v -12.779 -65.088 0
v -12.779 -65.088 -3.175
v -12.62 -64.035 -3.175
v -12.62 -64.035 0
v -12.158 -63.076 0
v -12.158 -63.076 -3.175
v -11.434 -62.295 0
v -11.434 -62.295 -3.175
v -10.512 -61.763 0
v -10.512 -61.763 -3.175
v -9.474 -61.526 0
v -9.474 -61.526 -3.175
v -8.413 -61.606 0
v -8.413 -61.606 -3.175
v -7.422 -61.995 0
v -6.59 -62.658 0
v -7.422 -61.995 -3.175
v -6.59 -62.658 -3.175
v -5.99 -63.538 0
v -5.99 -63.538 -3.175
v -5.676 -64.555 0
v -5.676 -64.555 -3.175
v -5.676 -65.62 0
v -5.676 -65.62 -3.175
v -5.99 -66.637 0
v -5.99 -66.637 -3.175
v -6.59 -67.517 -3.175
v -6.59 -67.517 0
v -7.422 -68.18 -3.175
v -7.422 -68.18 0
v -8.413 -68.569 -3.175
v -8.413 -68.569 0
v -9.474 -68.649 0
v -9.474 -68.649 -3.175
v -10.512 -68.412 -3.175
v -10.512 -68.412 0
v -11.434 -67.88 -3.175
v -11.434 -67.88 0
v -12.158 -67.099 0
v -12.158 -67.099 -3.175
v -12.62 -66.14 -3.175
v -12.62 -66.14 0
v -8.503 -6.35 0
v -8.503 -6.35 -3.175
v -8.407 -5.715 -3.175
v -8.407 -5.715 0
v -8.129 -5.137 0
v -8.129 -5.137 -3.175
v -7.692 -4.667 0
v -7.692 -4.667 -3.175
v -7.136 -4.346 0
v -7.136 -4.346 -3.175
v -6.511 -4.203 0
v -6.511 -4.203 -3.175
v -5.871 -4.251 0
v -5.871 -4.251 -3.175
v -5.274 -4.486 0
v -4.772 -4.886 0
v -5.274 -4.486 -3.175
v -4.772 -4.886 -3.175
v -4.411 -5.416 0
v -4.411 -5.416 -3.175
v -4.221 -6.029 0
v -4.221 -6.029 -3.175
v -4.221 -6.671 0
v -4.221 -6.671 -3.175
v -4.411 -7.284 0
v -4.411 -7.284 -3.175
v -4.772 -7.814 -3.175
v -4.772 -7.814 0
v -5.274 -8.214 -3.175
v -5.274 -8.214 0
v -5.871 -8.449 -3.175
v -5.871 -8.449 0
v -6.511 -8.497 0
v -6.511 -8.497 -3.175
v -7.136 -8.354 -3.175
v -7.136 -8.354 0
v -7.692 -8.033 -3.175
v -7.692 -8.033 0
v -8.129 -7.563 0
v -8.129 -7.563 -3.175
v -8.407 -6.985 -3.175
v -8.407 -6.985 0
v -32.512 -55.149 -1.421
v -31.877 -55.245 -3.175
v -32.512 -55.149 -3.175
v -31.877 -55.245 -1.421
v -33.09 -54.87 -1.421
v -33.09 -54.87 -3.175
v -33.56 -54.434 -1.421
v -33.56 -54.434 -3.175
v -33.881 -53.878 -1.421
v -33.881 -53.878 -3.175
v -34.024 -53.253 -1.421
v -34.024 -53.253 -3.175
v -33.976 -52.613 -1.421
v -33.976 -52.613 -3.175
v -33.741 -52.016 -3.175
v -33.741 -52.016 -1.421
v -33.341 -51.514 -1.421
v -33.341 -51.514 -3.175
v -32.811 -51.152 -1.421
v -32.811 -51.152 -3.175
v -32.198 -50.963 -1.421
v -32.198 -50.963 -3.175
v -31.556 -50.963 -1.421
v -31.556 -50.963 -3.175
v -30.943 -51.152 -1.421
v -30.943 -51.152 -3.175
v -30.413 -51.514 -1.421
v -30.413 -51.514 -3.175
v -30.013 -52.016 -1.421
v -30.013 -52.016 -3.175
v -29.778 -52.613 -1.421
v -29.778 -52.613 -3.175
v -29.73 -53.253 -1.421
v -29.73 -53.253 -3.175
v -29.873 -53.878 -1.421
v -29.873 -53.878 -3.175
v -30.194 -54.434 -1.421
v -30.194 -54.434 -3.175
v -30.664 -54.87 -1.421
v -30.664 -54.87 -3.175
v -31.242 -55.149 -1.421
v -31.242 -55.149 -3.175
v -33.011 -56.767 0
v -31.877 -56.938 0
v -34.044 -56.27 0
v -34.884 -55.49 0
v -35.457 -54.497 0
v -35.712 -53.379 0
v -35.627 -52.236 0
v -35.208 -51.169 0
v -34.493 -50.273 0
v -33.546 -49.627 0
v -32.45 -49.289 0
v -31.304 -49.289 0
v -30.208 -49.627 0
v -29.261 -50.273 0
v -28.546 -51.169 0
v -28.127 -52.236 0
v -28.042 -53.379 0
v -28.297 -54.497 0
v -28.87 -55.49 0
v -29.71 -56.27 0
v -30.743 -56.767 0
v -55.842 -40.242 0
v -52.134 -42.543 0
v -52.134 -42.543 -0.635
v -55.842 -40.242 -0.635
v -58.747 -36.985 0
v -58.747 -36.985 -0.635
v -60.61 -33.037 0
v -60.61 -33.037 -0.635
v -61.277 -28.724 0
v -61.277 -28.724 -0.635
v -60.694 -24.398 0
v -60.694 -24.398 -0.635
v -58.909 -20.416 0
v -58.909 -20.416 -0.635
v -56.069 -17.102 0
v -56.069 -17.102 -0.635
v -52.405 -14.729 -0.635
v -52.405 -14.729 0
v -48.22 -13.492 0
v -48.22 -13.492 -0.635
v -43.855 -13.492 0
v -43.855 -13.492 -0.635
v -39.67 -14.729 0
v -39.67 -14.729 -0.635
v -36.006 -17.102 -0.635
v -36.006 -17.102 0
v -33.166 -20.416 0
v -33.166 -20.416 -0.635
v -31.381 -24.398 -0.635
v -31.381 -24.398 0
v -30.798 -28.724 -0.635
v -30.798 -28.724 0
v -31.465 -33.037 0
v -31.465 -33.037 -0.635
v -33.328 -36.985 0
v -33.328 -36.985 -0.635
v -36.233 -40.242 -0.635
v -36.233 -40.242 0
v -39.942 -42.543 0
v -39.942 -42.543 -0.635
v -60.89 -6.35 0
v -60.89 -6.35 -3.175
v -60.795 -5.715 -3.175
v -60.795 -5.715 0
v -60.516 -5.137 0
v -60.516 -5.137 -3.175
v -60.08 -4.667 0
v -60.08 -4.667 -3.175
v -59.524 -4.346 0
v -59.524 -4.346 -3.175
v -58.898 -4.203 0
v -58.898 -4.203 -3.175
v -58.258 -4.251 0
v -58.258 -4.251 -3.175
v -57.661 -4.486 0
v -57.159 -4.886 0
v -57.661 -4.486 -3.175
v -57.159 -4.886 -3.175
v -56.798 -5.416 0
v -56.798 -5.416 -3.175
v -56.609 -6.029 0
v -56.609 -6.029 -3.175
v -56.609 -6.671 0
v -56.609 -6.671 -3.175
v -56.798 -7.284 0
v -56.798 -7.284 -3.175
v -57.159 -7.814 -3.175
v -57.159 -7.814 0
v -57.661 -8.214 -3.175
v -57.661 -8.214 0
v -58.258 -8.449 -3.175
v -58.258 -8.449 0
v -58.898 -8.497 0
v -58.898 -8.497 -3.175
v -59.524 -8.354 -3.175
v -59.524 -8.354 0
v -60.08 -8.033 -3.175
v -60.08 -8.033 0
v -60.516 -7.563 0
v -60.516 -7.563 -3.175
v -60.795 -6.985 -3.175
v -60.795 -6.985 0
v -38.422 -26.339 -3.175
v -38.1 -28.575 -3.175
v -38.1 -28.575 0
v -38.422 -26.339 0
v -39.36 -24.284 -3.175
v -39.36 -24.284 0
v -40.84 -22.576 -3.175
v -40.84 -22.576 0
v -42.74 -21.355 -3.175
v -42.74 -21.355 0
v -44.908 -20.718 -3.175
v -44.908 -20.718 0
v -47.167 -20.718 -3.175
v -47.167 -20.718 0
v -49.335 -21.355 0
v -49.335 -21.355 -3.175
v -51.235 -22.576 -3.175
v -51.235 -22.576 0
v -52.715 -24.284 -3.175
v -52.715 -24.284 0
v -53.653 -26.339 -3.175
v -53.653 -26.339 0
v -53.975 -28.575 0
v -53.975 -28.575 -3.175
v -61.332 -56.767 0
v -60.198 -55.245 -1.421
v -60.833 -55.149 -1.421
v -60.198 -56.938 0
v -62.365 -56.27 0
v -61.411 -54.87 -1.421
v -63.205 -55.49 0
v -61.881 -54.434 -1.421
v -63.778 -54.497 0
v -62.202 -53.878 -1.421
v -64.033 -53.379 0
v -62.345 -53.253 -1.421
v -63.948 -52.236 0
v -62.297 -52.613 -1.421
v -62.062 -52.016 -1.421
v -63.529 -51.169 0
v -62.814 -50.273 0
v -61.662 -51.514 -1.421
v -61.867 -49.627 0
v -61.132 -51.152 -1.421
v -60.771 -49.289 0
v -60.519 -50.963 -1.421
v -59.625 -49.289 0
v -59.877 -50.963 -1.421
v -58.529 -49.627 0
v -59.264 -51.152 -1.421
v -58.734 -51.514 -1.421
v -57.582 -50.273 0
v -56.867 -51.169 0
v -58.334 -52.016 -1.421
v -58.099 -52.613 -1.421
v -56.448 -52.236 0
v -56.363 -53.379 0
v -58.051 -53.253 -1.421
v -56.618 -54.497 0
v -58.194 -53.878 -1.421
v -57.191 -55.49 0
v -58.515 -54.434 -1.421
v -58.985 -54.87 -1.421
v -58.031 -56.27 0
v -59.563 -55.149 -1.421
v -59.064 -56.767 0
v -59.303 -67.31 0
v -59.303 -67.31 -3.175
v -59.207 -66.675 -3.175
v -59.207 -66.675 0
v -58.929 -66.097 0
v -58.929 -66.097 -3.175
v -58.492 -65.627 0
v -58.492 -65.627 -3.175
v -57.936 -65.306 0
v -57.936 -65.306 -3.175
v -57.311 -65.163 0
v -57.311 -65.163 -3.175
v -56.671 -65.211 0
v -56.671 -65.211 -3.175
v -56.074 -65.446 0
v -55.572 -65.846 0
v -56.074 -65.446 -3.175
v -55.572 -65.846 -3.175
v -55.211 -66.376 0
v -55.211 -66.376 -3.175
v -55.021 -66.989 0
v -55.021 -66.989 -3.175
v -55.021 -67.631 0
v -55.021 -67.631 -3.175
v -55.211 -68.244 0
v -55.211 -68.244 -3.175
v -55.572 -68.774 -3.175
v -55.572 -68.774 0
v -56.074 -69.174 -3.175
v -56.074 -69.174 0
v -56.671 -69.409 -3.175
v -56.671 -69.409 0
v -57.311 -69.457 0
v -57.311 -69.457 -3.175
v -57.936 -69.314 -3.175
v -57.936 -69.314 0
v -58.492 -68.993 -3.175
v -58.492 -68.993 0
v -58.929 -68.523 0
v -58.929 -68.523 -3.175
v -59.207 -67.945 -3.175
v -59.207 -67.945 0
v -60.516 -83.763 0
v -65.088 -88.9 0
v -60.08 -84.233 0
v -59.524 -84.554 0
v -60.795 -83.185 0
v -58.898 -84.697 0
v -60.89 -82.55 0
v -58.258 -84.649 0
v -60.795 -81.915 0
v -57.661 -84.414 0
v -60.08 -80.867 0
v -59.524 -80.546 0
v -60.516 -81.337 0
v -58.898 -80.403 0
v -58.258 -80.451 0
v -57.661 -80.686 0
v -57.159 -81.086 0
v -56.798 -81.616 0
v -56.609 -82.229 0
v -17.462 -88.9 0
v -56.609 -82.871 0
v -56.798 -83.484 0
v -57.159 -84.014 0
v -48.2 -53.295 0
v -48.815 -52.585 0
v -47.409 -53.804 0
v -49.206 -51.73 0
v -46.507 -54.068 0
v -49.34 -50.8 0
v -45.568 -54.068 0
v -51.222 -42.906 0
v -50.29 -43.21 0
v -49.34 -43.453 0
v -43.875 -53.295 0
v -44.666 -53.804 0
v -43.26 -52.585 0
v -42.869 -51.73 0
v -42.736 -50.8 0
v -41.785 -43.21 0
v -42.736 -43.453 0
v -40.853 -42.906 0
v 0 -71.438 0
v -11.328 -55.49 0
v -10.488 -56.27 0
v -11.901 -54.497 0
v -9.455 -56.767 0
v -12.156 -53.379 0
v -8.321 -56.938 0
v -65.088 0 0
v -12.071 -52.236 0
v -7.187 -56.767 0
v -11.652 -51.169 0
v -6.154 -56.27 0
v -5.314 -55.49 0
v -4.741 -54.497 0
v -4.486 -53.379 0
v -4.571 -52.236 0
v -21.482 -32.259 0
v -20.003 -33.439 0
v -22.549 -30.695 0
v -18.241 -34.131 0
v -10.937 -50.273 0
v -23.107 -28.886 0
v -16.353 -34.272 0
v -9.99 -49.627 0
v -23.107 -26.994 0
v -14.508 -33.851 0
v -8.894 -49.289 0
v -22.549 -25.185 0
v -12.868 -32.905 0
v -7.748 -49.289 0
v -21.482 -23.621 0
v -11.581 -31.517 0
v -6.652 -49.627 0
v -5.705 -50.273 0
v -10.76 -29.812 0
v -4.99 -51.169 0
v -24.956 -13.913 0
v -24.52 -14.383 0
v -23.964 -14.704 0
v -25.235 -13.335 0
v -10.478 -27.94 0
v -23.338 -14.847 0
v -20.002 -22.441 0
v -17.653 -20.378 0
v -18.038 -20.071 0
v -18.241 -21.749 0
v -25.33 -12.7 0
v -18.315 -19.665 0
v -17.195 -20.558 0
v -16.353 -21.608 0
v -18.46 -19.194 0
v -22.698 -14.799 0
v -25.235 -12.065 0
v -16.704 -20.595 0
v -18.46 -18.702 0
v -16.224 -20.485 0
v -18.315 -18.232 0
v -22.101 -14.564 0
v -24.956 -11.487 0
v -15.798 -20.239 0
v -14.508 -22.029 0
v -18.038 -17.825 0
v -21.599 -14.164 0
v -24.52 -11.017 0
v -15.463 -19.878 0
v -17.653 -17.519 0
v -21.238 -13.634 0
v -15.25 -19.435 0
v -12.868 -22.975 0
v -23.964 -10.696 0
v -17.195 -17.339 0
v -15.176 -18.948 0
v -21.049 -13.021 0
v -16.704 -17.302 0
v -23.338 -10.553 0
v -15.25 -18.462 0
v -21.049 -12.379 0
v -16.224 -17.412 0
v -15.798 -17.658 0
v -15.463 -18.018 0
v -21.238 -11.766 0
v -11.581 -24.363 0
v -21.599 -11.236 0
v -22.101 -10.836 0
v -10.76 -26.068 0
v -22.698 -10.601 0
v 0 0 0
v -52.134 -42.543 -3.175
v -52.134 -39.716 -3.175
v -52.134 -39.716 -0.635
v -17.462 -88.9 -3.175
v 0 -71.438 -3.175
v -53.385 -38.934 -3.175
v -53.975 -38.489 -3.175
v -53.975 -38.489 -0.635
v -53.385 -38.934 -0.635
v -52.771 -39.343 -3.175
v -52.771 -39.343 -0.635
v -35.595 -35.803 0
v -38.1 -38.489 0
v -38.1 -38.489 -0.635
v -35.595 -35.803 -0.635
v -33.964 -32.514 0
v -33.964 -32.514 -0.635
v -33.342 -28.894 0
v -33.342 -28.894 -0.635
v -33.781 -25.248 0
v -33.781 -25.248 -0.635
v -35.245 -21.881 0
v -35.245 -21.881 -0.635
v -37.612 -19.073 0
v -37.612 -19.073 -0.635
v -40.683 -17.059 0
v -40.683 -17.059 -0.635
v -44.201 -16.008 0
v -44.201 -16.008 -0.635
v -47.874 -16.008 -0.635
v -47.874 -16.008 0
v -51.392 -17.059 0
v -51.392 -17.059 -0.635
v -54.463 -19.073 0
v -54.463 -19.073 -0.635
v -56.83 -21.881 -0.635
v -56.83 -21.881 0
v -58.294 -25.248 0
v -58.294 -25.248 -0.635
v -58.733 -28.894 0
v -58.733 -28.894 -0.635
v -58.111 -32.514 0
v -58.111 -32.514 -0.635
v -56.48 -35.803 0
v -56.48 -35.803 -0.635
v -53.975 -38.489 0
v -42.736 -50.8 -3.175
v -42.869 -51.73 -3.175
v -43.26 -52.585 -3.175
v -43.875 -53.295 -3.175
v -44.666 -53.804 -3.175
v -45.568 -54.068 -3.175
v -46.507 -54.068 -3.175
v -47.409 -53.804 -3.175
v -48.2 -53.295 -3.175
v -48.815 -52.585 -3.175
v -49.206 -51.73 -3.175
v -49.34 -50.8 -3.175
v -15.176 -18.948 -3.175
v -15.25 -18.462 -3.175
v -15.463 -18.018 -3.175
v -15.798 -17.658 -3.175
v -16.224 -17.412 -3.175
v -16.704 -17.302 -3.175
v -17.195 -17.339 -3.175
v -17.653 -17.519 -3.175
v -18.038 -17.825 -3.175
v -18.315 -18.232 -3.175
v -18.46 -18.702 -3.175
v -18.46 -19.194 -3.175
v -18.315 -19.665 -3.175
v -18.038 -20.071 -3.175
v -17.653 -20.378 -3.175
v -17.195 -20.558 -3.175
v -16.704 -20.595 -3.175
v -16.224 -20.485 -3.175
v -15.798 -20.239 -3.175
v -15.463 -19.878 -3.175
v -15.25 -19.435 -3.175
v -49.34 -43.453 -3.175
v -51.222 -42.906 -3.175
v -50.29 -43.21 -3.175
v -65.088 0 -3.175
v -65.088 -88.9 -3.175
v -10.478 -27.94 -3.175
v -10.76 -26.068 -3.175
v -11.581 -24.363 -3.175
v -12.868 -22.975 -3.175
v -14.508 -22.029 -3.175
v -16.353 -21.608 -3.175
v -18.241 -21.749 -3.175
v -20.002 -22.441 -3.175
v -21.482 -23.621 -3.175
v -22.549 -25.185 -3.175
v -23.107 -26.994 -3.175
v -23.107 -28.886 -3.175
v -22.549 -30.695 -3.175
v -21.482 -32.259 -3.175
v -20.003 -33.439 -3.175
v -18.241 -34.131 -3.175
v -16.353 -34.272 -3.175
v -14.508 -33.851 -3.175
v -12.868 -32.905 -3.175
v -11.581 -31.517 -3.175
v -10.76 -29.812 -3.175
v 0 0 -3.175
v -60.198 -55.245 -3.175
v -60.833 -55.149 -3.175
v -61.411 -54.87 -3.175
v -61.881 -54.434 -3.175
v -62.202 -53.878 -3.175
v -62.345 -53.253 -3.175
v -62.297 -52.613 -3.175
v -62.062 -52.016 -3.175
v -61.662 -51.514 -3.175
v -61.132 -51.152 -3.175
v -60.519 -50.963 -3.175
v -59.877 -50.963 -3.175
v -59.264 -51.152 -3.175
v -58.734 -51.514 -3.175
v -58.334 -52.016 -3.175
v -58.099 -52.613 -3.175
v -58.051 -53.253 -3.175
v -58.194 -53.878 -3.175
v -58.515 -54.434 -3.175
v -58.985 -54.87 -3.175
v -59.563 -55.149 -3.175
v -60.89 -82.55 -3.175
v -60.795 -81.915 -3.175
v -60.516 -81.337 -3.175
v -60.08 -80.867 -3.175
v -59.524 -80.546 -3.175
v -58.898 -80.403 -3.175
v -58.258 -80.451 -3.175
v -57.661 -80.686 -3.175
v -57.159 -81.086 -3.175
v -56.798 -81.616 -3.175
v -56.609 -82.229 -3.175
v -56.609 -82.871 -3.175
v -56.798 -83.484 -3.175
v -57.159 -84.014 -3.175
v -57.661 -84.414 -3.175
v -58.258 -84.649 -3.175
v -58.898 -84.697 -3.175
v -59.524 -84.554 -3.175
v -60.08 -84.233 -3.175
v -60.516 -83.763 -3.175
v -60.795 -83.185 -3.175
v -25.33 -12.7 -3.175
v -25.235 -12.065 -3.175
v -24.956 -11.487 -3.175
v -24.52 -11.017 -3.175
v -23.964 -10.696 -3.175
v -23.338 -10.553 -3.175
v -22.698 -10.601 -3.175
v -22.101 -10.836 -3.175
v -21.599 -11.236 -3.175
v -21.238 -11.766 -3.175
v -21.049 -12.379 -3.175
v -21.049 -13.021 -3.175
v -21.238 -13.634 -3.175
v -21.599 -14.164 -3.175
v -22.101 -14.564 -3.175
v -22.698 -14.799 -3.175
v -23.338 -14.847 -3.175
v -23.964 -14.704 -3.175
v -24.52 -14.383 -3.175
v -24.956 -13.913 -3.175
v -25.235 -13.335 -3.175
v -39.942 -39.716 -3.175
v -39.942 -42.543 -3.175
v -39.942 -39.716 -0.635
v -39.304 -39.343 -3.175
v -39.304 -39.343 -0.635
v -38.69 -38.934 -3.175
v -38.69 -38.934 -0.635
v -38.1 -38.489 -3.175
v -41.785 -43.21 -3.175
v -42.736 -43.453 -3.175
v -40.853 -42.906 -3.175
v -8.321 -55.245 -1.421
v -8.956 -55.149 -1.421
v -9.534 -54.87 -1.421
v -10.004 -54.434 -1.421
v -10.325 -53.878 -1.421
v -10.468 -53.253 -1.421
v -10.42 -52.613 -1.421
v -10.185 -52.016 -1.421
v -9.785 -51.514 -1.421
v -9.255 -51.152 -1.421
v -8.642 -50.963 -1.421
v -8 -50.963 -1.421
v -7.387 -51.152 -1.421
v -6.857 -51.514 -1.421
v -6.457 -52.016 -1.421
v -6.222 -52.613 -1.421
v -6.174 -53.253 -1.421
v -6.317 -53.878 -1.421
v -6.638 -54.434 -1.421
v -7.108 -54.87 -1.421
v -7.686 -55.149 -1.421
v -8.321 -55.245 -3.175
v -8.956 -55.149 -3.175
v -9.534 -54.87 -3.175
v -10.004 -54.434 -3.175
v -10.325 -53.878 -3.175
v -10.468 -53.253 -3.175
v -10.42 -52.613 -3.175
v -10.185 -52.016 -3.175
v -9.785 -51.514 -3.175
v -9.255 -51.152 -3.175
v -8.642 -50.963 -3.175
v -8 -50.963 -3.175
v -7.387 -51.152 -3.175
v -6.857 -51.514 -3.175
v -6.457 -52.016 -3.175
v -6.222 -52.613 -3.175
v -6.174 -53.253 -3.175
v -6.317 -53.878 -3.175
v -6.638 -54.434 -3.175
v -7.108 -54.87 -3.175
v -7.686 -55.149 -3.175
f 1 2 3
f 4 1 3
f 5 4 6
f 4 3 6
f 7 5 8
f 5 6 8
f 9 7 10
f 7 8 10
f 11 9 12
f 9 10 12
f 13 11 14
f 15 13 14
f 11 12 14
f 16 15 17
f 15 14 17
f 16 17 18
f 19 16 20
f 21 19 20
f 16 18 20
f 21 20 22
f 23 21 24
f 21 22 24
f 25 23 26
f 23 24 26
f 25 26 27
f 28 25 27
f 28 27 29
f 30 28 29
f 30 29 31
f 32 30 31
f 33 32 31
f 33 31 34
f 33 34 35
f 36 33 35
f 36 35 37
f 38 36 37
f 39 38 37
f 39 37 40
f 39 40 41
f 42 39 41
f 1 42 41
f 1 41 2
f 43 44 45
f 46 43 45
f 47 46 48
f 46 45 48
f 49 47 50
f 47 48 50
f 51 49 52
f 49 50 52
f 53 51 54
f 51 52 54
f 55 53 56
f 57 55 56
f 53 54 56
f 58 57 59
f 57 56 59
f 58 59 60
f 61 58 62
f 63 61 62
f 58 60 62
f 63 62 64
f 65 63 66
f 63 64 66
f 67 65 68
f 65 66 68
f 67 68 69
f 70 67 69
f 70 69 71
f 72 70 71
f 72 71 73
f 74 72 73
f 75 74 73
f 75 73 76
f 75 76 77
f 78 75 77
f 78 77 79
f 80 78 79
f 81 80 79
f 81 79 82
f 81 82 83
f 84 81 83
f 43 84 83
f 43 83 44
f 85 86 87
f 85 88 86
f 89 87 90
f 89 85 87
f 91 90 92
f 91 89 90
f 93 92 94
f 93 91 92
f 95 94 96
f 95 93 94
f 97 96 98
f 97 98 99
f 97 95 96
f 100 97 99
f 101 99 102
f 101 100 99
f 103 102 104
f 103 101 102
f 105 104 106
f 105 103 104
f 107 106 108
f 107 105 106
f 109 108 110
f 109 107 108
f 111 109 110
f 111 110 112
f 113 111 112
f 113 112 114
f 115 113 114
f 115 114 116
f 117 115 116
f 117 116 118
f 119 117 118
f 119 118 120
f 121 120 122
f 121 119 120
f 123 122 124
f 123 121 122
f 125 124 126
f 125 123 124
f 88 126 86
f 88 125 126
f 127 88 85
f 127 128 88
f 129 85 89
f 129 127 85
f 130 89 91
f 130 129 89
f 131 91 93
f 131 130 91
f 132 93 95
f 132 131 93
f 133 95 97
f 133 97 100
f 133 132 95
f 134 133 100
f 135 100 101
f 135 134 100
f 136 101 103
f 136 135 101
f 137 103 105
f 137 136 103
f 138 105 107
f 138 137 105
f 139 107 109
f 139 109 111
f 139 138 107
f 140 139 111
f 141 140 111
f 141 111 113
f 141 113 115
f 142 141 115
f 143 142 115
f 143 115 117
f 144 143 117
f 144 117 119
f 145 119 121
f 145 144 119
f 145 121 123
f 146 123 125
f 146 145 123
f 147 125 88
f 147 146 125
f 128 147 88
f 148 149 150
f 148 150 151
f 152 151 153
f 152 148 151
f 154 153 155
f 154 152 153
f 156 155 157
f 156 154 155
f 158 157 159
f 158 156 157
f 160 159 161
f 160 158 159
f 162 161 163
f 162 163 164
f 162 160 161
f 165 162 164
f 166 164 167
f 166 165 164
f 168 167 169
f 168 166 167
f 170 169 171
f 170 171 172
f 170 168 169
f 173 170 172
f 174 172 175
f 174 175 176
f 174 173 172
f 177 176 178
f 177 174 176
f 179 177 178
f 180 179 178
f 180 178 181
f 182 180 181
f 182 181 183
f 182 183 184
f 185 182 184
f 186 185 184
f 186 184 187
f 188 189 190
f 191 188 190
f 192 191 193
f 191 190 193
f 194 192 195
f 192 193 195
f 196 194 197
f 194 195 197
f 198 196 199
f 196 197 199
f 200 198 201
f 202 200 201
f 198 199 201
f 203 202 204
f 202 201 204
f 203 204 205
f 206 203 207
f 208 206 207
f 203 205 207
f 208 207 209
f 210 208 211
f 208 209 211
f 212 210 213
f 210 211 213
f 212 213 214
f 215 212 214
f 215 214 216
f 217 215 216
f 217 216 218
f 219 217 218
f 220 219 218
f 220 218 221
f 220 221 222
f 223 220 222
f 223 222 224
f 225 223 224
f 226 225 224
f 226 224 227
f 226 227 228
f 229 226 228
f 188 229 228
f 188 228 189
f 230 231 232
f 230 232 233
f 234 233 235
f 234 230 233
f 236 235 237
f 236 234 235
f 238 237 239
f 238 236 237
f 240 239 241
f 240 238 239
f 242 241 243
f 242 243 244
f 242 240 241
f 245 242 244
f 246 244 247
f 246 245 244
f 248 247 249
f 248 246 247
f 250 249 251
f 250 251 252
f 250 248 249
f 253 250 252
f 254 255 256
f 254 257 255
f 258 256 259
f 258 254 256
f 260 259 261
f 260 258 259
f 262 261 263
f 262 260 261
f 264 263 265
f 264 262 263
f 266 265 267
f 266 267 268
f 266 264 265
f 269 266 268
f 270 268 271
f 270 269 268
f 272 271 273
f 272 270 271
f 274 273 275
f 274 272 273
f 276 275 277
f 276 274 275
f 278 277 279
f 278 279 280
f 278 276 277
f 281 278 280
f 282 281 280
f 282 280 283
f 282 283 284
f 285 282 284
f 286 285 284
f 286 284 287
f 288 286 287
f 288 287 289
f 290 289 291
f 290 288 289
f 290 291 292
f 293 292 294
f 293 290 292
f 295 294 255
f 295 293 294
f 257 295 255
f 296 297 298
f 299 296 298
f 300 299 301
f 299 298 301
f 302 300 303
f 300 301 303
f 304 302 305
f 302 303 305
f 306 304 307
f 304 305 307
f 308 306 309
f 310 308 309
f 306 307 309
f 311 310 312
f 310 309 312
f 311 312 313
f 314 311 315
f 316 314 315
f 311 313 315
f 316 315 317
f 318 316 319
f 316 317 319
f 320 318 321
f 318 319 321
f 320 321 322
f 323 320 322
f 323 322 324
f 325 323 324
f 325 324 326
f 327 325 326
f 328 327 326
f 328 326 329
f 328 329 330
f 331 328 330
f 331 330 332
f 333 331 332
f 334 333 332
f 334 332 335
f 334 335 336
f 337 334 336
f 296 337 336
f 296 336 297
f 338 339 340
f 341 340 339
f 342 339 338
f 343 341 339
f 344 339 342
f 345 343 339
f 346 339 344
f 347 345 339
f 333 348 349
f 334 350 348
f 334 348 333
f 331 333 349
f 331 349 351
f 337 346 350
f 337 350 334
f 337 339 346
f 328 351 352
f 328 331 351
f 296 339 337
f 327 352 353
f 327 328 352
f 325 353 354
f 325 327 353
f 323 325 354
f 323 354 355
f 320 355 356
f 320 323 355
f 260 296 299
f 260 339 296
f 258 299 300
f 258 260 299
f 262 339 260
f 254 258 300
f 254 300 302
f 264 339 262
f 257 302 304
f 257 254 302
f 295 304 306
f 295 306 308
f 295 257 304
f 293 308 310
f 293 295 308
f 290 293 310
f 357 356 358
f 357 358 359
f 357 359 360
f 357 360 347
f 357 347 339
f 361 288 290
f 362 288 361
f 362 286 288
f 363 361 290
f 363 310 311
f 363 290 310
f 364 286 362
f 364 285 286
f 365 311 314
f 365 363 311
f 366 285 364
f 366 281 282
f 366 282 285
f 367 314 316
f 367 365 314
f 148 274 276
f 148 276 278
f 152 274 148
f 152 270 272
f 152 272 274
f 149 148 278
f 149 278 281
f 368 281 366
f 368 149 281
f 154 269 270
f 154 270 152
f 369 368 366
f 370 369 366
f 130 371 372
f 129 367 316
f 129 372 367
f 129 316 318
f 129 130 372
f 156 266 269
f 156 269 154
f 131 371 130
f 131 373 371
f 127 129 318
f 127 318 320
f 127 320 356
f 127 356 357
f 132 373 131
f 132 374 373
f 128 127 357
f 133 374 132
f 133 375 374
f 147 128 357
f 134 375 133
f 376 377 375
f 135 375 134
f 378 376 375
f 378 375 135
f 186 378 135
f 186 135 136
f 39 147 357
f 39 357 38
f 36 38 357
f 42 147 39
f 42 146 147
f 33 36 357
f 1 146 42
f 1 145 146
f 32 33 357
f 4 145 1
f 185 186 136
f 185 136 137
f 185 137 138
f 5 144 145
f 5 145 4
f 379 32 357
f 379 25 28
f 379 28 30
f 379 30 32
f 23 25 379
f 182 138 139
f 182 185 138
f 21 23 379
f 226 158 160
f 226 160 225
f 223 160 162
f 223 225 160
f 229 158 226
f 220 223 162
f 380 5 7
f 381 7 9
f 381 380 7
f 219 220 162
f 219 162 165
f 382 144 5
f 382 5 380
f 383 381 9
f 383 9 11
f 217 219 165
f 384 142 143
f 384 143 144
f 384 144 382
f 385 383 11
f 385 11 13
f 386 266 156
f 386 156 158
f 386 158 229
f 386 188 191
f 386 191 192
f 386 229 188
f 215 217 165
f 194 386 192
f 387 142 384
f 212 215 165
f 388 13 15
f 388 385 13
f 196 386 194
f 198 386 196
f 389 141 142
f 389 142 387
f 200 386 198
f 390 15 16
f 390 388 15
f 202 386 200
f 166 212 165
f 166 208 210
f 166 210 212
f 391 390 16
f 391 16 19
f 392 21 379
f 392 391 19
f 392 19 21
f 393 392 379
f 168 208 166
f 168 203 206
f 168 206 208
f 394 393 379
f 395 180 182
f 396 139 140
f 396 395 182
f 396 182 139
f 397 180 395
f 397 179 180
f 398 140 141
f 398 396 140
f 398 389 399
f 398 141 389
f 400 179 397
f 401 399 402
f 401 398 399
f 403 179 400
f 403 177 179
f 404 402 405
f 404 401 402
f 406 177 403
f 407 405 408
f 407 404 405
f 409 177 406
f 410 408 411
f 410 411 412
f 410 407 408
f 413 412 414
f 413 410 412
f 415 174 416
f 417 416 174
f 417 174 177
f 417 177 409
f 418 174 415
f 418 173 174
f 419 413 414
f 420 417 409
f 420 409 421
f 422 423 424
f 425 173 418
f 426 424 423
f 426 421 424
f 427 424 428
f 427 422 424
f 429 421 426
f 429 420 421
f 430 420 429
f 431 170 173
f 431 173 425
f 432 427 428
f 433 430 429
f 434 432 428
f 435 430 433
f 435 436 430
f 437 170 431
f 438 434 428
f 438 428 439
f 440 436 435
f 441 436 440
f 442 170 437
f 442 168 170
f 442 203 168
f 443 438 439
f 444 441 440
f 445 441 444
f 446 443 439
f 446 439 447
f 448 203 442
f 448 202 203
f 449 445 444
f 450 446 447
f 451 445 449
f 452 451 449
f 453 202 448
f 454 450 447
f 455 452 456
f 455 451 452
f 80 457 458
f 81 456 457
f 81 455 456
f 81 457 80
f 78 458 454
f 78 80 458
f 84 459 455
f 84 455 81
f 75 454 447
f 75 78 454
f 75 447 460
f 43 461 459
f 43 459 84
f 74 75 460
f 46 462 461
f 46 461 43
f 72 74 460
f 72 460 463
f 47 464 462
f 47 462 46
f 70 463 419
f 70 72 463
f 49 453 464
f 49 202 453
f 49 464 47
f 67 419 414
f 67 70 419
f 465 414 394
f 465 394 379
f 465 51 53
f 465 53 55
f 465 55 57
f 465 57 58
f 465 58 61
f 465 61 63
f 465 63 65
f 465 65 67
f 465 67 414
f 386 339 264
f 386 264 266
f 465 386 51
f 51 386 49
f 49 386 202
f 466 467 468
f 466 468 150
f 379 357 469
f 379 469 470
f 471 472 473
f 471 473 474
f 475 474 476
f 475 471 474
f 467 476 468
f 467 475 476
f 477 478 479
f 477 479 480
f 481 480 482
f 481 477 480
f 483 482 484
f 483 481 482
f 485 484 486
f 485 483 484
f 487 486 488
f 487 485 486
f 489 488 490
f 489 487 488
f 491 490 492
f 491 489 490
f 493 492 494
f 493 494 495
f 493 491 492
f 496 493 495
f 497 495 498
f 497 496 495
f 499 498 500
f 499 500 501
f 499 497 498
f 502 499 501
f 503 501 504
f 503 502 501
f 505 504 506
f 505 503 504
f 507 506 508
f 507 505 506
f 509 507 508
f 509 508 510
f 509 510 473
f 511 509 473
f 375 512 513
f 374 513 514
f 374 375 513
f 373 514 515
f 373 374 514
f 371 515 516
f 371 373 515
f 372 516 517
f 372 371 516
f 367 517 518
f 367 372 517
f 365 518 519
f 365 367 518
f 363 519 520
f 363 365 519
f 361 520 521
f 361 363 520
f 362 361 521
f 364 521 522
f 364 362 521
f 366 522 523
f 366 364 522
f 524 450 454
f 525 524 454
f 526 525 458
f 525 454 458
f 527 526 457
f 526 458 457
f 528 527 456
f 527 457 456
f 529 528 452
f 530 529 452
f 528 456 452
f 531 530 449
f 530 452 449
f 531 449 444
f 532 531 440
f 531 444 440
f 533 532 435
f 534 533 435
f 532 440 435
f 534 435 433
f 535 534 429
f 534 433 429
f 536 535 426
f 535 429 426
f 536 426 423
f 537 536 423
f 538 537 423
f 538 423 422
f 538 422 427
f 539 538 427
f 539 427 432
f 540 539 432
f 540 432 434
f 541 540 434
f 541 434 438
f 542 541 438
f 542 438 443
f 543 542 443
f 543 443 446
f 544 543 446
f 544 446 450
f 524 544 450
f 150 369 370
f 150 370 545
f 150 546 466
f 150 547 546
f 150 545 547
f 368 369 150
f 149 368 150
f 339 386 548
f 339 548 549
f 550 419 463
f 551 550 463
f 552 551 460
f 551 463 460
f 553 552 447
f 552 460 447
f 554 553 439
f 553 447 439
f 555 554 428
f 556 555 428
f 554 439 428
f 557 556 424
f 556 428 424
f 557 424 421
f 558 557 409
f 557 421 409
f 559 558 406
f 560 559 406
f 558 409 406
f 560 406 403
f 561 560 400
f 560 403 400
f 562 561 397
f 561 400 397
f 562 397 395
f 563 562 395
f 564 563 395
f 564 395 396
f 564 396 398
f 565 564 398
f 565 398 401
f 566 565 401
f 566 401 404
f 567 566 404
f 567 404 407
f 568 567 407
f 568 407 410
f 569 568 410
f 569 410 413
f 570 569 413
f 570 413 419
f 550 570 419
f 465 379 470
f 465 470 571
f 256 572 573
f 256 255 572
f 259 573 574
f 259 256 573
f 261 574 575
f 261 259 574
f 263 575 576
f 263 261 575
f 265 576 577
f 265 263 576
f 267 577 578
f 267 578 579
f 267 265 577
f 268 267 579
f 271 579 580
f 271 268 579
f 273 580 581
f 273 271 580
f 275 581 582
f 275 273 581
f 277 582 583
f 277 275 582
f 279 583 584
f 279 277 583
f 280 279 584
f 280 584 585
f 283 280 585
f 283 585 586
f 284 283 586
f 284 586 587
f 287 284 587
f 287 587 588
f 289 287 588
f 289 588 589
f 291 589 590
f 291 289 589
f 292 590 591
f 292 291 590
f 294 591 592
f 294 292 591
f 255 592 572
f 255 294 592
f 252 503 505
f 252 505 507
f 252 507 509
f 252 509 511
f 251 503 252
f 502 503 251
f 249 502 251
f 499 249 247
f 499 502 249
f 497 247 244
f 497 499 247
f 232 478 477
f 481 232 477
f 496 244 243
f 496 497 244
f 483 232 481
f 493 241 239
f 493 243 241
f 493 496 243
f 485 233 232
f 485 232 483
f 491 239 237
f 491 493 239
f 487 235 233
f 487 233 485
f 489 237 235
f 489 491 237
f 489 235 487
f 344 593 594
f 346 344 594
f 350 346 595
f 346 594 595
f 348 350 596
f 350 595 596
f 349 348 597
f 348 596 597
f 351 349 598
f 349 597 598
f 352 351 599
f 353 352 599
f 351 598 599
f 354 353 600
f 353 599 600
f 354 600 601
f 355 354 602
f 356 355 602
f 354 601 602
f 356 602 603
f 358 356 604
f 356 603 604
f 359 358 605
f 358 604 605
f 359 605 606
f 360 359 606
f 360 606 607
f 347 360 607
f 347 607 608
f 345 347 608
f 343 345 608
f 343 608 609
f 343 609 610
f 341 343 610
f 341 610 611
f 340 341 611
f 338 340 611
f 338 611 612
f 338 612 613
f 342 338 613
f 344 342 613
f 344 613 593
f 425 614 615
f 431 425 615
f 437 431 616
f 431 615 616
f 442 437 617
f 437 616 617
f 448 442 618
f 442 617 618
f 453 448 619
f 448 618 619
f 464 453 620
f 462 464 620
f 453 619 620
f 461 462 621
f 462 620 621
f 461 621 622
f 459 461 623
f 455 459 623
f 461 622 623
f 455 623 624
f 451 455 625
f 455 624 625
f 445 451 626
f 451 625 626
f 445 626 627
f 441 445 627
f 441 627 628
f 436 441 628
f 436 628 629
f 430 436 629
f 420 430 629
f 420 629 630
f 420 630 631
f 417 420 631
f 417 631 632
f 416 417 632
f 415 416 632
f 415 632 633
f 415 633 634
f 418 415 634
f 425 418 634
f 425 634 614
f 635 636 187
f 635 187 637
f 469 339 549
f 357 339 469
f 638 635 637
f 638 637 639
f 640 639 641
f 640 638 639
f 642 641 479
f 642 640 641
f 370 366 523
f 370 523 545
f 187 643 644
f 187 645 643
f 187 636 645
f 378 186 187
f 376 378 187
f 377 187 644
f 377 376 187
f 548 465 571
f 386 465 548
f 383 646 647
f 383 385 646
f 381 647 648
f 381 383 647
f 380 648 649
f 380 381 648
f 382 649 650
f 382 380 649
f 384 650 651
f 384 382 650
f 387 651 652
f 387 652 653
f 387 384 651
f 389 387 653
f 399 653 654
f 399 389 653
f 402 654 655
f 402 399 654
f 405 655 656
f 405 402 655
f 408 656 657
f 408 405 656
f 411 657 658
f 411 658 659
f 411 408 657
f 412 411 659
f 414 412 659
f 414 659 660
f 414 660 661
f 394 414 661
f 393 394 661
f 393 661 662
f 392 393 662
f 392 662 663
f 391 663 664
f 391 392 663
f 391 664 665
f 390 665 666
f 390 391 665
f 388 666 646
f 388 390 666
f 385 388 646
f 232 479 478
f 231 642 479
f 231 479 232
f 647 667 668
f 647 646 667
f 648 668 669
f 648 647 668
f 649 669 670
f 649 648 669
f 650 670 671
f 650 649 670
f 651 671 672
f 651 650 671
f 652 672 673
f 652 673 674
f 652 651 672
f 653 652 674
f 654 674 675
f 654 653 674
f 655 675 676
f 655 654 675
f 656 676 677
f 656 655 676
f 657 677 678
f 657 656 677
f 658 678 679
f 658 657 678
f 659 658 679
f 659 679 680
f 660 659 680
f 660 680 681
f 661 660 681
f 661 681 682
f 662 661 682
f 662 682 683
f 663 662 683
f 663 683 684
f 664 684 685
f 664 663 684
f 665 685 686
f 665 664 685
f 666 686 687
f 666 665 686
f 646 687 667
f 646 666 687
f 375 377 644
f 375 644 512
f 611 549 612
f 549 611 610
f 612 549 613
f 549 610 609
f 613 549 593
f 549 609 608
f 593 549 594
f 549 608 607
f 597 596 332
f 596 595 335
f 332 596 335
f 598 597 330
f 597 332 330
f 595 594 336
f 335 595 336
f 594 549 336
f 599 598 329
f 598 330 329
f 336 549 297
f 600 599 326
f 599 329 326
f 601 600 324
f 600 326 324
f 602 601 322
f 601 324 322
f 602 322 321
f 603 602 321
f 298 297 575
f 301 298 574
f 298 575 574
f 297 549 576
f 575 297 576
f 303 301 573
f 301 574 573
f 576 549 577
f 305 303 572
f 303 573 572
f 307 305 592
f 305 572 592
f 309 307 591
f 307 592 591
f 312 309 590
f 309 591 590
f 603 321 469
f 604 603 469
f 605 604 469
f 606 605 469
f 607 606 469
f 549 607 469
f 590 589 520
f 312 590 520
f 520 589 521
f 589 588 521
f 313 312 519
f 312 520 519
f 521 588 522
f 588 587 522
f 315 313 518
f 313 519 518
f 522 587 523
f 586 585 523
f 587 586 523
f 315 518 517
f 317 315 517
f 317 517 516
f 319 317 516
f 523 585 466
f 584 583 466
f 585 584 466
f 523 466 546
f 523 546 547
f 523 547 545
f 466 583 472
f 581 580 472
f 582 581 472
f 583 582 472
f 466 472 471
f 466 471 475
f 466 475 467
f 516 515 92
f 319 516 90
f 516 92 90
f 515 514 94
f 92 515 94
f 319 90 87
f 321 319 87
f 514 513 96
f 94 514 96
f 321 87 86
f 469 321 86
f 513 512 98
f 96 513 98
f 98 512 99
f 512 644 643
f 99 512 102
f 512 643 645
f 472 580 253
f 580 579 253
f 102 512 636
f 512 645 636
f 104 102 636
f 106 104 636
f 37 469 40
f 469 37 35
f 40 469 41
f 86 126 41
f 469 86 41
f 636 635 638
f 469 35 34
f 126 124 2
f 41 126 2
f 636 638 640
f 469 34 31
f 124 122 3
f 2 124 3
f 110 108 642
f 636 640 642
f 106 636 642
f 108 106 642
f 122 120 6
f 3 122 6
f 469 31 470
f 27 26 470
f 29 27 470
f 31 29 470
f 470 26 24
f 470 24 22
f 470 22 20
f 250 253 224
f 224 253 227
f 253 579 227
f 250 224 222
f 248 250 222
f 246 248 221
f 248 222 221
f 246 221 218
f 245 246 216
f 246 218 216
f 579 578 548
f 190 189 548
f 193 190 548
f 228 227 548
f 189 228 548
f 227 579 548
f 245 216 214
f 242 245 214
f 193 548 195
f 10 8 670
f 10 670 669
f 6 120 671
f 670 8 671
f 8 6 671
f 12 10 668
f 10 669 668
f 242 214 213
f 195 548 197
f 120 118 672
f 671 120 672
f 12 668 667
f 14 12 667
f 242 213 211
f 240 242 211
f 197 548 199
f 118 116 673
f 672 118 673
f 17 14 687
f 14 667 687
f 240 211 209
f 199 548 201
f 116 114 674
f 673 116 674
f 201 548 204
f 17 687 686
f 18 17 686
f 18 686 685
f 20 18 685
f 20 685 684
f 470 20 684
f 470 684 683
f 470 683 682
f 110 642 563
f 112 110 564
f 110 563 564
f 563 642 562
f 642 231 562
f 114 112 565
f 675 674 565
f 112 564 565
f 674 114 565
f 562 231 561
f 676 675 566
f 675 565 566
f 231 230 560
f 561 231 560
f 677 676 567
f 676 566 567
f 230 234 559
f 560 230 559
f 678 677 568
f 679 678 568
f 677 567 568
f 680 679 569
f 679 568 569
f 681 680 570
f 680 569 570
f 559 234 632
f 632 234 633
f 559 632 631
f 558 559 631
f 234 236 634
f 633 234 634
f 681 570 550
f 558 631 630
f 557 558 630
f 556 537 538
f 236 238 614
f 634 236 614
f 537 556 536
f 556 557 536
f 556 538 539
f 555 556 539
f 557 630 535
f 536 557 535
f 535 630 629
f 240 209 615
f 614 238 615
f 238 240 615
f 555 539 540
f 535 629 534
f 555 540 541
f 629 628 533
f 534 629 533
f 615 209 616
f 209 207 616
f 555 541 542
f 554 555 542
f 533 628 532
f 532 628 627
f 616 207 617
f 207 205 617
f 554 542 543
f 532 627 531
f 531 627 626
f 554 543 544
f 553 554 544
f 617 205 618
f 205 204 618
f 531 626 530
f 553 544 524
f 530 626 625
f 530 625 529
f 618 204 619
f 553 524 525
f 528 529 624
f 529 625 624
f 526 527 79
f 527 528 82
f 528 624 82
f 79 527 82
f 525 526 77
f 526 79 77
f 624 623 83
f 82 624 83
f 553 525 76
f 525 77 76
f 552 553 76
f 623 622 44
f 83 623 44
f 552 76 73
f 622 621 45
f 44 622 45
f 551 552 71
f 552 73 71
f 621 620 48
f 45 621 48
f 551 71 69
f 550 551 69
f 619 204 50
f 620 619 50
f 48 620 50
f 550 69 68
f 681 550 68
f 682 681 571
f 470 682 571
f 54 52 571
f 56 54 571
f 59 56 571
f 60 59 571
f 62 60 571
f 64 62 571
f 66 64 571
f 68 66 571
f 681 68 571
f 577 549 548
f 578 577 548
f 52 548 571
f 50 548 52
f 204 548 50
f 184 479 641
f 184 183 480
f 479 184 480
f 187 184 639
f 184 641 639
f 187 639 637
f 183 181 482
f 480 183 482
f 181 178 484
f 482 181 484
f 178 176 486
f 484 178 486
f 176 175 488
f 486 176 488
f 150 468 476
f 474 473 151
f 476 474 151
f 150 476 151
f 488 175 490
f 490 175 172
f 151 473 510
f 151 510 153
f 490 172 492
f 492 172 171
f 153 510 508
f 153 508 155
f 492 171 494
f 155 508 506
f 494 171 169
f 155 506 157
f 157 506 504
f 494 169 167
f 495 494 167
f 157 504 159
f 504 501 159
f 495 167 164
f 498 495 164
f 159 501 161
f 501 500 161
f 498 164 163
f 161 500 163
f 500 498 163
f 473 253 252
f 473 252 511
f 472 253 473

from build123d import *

# Parameters (mm, degrees)
BOSS_EXTRUDE1_DEPTH                       = 3.175
F_6_CLEARANCE_HOLE1_D                     = 4.3053
CUT_EXTRUDE1_DEPTH                        = 4.175
SKETCH5_R                                 = 6.35
SKETCH5_R_2                               = 1.651
CUT_EXTRUDE2_DEPTH                        = 4.175
F_1_4_CLEARANCE_HOLE1_D                   = 7.14248
BOSS_EXTRUDE2_DEPTH                       = 3.175
CUT_EXTRUDE3_DEPTH                        = 0.635
CSK_FOR_6_FLAT_HEAD_MACHINE_SCREW_2_COUNT = 2
CSK_FOR_6_FLAT_HEAD_MACHINE_SCREW_2_PITCH = 28.321
CSK_FOR_6_FLAT_HEAD_MACHINE_SCREW_3_COUNT = 2
CSK_FOR_6_FLAT_HEAD_MACHINE_SCREW_3_PITCH = 23.555999878


with BuildPart() as part:
    # Sketch1 → Boss-Extrude1 (new body)
    with BuildSketch(Plane.XY):
        Polygon((-65.0875, 0), (-65.0875, -88.9), (-17.4625, -88.9), (0, -71.4375), (0, 0), align=None)
    extrude(amount=-BOSS_EXTRUDE1_DEPTH)

    # #6 Clearance Hole1 (through all)
    with Locations(Plane.XY):
        with Locations((-58.7375, -6.35), (-6.35, -6.35), (-23.1775, -12.7), (-57.15, -67.31), (-58.7375, -82.55)):
            Hole(F_6_CLEARANCE_HOLE1_D / 2)

    # Sketch4 → Cut-Extrude1 (cut, through all)
    with BuildSketch(Plane.XY):
        with BuildLine():
            Line((-49.3395, -50.8), (-49.3395, -43.4529836))
            ThreePointArc((-49.3395, -43.4529836), (-46.0375, -13.335), (-42.7355, -43.4529836))
            Line((-42.7355, -43.4529836), (-42.7355, -50.8))
            ThreePointArc((-42.7355, -50.8), (-46.0375, -54.102), (-49.3395, -50.8))
        make_face()
    extrude(amount=-CUT_EXTRUDE1_DEPTH, mode=Mode.SUBTRACT)

    # Sketch5 → Cut-Extrude2 (cut, through all)
    with BuildSketch(Plane.XY):
        with Locations((-16.8275, -27.94)):
            Circle(SKETCH5_R)
        with Locations((-16.8275, -18.9484)):
            Circle(SKETCH5_R_2)
    extrude(amount=-CUT_EXTRUDE2_DEPTH, mode=Mode.SUBTRACT)

    # 1/4 Clearance Hole1 (through all)
    with Locations(Plane.XY):
        with Locations((-9.2075, -65.0875)):
            Hole(F_1_4_CLEARANCE_HOLE1_D / 2)

    # Sketch8 → Boss-Extrude2 (add, through all)
    with BuildSketch(Plane(origin=(0, 0, -3.175), x_dir=(-1, 0, 0), z_dir=(0, 0, -1))):
        with BuildLine():
            Line((52.1335, -39.716309797), (52.1335, -42.542690718))
            ThreePointArc((52.1335, -42.542690718), (46.0375, -13.335), (39.9415, -42.542690718))
            Line((39.9415, -42.542690718), (39.9415, -39.716309797))
            ThreePointArc((39.9415, -39.716309797), (38.993964439, -39.142809934), (38.1, -38.488934323))
            Line((38.1, -38.488934323), (38.1, -28.575))
            ThreePointArc((38.1, -28.575), (46.0375, -20.6375), (53.975, -28.575))
            Line((53.975, -28.575), (53.975, -38.488934323))
            ThreePointArc((53.975, -38.488934323), (53.081035561, -39.142809934), (52.1335, -39.716309797))
        make_face()
    extrude(amount=-BOSS_EXTRUDE2_DEPTH)

    # Sketch9 → Cut-Extrude3 (cut)
    with BuildSketch(Plane.XY):
        with BuildLine():
            Line((-52.1335, -39.716309797), (-52.1335, -42.542690718))
            ThreePointArc((-52.1335, -42.542690718), (-46.0375, -13.335), (-39.9415, -42.542690718))
            Line((-39.9415, -42.542690718), (-39.9415, -39.716309797))
            ThreePointArc((-39.9415, -39.716309797), (-38.993964439, -39.142809934), (-38.1, -38.488934323))
            ThreePointArc((-38.1, -38.488934323), (-46.0375, -15.875), (-53.975, -38.488934323))
            ThreePointArc((-53.975, -38.488934323), (-53.081035561, -39.142809934), (-52.1335, -39.716309797))
        make_face()
    extrude(amount=-CUT_EXTRUDE3_DEPTH, mode=Mode.SUBTRACT)

    # Sketch10 → CSK for #6 Flat Head Machine Screw (100)1 (revolve, cut)
    with BuildSketch(Plane(origin=(-31.877, -53.091877173, 0), x_dir=(0, -1, 0), z_dir=(1, 0, 0))):
        Polygon((0, 0), (0, 3.175), (2.15265, 3.175), (2.15265, 1.420893136), (3.8460045, 0), align=None)
    csk_for_6_flat_head_machine_screw_100 = revolve(axis=Axis((-31.877, -53.091877173, 6.35), (0, 0, -1)), mode=Mode.SUBTRACT)

    # CSK for _6 Flat Head Machine Screw _ 2: CSK for #6 Flat Head Machine Screw (100)1 ×2
    with Locations(*[(-i * CSK_FOR_6_FLAT_HEAD_MACHINE_SCREW_2_PITCH, 0, 0) for i in range(1, CSK_FOR_6_FLAT_HEAD_MACHINE_SCREW_2_COUNT)]):
        add(csk_for_6_flat_head_machine_screw_100, mode=Mode.SUBTRACT)

    # CSK for _6 Flat Head Machine Screw _ 3: CSK for #6 Flat Head Machine Screw (100)1 ×2
    with Locations(*[(i * CSK_FOR_6_FLAT_HEAD_MACHINE_SCREW_3_PITCH, 0, 0) for i in range(1, CSK_FOR_6_FLAT_HEAD_MACHINE_SCREW_3_COUNT)]):
        add(csk_for_6_flat_head_machine_screw_100, mode=Mode.SUBTRACT)


solid = part.part
